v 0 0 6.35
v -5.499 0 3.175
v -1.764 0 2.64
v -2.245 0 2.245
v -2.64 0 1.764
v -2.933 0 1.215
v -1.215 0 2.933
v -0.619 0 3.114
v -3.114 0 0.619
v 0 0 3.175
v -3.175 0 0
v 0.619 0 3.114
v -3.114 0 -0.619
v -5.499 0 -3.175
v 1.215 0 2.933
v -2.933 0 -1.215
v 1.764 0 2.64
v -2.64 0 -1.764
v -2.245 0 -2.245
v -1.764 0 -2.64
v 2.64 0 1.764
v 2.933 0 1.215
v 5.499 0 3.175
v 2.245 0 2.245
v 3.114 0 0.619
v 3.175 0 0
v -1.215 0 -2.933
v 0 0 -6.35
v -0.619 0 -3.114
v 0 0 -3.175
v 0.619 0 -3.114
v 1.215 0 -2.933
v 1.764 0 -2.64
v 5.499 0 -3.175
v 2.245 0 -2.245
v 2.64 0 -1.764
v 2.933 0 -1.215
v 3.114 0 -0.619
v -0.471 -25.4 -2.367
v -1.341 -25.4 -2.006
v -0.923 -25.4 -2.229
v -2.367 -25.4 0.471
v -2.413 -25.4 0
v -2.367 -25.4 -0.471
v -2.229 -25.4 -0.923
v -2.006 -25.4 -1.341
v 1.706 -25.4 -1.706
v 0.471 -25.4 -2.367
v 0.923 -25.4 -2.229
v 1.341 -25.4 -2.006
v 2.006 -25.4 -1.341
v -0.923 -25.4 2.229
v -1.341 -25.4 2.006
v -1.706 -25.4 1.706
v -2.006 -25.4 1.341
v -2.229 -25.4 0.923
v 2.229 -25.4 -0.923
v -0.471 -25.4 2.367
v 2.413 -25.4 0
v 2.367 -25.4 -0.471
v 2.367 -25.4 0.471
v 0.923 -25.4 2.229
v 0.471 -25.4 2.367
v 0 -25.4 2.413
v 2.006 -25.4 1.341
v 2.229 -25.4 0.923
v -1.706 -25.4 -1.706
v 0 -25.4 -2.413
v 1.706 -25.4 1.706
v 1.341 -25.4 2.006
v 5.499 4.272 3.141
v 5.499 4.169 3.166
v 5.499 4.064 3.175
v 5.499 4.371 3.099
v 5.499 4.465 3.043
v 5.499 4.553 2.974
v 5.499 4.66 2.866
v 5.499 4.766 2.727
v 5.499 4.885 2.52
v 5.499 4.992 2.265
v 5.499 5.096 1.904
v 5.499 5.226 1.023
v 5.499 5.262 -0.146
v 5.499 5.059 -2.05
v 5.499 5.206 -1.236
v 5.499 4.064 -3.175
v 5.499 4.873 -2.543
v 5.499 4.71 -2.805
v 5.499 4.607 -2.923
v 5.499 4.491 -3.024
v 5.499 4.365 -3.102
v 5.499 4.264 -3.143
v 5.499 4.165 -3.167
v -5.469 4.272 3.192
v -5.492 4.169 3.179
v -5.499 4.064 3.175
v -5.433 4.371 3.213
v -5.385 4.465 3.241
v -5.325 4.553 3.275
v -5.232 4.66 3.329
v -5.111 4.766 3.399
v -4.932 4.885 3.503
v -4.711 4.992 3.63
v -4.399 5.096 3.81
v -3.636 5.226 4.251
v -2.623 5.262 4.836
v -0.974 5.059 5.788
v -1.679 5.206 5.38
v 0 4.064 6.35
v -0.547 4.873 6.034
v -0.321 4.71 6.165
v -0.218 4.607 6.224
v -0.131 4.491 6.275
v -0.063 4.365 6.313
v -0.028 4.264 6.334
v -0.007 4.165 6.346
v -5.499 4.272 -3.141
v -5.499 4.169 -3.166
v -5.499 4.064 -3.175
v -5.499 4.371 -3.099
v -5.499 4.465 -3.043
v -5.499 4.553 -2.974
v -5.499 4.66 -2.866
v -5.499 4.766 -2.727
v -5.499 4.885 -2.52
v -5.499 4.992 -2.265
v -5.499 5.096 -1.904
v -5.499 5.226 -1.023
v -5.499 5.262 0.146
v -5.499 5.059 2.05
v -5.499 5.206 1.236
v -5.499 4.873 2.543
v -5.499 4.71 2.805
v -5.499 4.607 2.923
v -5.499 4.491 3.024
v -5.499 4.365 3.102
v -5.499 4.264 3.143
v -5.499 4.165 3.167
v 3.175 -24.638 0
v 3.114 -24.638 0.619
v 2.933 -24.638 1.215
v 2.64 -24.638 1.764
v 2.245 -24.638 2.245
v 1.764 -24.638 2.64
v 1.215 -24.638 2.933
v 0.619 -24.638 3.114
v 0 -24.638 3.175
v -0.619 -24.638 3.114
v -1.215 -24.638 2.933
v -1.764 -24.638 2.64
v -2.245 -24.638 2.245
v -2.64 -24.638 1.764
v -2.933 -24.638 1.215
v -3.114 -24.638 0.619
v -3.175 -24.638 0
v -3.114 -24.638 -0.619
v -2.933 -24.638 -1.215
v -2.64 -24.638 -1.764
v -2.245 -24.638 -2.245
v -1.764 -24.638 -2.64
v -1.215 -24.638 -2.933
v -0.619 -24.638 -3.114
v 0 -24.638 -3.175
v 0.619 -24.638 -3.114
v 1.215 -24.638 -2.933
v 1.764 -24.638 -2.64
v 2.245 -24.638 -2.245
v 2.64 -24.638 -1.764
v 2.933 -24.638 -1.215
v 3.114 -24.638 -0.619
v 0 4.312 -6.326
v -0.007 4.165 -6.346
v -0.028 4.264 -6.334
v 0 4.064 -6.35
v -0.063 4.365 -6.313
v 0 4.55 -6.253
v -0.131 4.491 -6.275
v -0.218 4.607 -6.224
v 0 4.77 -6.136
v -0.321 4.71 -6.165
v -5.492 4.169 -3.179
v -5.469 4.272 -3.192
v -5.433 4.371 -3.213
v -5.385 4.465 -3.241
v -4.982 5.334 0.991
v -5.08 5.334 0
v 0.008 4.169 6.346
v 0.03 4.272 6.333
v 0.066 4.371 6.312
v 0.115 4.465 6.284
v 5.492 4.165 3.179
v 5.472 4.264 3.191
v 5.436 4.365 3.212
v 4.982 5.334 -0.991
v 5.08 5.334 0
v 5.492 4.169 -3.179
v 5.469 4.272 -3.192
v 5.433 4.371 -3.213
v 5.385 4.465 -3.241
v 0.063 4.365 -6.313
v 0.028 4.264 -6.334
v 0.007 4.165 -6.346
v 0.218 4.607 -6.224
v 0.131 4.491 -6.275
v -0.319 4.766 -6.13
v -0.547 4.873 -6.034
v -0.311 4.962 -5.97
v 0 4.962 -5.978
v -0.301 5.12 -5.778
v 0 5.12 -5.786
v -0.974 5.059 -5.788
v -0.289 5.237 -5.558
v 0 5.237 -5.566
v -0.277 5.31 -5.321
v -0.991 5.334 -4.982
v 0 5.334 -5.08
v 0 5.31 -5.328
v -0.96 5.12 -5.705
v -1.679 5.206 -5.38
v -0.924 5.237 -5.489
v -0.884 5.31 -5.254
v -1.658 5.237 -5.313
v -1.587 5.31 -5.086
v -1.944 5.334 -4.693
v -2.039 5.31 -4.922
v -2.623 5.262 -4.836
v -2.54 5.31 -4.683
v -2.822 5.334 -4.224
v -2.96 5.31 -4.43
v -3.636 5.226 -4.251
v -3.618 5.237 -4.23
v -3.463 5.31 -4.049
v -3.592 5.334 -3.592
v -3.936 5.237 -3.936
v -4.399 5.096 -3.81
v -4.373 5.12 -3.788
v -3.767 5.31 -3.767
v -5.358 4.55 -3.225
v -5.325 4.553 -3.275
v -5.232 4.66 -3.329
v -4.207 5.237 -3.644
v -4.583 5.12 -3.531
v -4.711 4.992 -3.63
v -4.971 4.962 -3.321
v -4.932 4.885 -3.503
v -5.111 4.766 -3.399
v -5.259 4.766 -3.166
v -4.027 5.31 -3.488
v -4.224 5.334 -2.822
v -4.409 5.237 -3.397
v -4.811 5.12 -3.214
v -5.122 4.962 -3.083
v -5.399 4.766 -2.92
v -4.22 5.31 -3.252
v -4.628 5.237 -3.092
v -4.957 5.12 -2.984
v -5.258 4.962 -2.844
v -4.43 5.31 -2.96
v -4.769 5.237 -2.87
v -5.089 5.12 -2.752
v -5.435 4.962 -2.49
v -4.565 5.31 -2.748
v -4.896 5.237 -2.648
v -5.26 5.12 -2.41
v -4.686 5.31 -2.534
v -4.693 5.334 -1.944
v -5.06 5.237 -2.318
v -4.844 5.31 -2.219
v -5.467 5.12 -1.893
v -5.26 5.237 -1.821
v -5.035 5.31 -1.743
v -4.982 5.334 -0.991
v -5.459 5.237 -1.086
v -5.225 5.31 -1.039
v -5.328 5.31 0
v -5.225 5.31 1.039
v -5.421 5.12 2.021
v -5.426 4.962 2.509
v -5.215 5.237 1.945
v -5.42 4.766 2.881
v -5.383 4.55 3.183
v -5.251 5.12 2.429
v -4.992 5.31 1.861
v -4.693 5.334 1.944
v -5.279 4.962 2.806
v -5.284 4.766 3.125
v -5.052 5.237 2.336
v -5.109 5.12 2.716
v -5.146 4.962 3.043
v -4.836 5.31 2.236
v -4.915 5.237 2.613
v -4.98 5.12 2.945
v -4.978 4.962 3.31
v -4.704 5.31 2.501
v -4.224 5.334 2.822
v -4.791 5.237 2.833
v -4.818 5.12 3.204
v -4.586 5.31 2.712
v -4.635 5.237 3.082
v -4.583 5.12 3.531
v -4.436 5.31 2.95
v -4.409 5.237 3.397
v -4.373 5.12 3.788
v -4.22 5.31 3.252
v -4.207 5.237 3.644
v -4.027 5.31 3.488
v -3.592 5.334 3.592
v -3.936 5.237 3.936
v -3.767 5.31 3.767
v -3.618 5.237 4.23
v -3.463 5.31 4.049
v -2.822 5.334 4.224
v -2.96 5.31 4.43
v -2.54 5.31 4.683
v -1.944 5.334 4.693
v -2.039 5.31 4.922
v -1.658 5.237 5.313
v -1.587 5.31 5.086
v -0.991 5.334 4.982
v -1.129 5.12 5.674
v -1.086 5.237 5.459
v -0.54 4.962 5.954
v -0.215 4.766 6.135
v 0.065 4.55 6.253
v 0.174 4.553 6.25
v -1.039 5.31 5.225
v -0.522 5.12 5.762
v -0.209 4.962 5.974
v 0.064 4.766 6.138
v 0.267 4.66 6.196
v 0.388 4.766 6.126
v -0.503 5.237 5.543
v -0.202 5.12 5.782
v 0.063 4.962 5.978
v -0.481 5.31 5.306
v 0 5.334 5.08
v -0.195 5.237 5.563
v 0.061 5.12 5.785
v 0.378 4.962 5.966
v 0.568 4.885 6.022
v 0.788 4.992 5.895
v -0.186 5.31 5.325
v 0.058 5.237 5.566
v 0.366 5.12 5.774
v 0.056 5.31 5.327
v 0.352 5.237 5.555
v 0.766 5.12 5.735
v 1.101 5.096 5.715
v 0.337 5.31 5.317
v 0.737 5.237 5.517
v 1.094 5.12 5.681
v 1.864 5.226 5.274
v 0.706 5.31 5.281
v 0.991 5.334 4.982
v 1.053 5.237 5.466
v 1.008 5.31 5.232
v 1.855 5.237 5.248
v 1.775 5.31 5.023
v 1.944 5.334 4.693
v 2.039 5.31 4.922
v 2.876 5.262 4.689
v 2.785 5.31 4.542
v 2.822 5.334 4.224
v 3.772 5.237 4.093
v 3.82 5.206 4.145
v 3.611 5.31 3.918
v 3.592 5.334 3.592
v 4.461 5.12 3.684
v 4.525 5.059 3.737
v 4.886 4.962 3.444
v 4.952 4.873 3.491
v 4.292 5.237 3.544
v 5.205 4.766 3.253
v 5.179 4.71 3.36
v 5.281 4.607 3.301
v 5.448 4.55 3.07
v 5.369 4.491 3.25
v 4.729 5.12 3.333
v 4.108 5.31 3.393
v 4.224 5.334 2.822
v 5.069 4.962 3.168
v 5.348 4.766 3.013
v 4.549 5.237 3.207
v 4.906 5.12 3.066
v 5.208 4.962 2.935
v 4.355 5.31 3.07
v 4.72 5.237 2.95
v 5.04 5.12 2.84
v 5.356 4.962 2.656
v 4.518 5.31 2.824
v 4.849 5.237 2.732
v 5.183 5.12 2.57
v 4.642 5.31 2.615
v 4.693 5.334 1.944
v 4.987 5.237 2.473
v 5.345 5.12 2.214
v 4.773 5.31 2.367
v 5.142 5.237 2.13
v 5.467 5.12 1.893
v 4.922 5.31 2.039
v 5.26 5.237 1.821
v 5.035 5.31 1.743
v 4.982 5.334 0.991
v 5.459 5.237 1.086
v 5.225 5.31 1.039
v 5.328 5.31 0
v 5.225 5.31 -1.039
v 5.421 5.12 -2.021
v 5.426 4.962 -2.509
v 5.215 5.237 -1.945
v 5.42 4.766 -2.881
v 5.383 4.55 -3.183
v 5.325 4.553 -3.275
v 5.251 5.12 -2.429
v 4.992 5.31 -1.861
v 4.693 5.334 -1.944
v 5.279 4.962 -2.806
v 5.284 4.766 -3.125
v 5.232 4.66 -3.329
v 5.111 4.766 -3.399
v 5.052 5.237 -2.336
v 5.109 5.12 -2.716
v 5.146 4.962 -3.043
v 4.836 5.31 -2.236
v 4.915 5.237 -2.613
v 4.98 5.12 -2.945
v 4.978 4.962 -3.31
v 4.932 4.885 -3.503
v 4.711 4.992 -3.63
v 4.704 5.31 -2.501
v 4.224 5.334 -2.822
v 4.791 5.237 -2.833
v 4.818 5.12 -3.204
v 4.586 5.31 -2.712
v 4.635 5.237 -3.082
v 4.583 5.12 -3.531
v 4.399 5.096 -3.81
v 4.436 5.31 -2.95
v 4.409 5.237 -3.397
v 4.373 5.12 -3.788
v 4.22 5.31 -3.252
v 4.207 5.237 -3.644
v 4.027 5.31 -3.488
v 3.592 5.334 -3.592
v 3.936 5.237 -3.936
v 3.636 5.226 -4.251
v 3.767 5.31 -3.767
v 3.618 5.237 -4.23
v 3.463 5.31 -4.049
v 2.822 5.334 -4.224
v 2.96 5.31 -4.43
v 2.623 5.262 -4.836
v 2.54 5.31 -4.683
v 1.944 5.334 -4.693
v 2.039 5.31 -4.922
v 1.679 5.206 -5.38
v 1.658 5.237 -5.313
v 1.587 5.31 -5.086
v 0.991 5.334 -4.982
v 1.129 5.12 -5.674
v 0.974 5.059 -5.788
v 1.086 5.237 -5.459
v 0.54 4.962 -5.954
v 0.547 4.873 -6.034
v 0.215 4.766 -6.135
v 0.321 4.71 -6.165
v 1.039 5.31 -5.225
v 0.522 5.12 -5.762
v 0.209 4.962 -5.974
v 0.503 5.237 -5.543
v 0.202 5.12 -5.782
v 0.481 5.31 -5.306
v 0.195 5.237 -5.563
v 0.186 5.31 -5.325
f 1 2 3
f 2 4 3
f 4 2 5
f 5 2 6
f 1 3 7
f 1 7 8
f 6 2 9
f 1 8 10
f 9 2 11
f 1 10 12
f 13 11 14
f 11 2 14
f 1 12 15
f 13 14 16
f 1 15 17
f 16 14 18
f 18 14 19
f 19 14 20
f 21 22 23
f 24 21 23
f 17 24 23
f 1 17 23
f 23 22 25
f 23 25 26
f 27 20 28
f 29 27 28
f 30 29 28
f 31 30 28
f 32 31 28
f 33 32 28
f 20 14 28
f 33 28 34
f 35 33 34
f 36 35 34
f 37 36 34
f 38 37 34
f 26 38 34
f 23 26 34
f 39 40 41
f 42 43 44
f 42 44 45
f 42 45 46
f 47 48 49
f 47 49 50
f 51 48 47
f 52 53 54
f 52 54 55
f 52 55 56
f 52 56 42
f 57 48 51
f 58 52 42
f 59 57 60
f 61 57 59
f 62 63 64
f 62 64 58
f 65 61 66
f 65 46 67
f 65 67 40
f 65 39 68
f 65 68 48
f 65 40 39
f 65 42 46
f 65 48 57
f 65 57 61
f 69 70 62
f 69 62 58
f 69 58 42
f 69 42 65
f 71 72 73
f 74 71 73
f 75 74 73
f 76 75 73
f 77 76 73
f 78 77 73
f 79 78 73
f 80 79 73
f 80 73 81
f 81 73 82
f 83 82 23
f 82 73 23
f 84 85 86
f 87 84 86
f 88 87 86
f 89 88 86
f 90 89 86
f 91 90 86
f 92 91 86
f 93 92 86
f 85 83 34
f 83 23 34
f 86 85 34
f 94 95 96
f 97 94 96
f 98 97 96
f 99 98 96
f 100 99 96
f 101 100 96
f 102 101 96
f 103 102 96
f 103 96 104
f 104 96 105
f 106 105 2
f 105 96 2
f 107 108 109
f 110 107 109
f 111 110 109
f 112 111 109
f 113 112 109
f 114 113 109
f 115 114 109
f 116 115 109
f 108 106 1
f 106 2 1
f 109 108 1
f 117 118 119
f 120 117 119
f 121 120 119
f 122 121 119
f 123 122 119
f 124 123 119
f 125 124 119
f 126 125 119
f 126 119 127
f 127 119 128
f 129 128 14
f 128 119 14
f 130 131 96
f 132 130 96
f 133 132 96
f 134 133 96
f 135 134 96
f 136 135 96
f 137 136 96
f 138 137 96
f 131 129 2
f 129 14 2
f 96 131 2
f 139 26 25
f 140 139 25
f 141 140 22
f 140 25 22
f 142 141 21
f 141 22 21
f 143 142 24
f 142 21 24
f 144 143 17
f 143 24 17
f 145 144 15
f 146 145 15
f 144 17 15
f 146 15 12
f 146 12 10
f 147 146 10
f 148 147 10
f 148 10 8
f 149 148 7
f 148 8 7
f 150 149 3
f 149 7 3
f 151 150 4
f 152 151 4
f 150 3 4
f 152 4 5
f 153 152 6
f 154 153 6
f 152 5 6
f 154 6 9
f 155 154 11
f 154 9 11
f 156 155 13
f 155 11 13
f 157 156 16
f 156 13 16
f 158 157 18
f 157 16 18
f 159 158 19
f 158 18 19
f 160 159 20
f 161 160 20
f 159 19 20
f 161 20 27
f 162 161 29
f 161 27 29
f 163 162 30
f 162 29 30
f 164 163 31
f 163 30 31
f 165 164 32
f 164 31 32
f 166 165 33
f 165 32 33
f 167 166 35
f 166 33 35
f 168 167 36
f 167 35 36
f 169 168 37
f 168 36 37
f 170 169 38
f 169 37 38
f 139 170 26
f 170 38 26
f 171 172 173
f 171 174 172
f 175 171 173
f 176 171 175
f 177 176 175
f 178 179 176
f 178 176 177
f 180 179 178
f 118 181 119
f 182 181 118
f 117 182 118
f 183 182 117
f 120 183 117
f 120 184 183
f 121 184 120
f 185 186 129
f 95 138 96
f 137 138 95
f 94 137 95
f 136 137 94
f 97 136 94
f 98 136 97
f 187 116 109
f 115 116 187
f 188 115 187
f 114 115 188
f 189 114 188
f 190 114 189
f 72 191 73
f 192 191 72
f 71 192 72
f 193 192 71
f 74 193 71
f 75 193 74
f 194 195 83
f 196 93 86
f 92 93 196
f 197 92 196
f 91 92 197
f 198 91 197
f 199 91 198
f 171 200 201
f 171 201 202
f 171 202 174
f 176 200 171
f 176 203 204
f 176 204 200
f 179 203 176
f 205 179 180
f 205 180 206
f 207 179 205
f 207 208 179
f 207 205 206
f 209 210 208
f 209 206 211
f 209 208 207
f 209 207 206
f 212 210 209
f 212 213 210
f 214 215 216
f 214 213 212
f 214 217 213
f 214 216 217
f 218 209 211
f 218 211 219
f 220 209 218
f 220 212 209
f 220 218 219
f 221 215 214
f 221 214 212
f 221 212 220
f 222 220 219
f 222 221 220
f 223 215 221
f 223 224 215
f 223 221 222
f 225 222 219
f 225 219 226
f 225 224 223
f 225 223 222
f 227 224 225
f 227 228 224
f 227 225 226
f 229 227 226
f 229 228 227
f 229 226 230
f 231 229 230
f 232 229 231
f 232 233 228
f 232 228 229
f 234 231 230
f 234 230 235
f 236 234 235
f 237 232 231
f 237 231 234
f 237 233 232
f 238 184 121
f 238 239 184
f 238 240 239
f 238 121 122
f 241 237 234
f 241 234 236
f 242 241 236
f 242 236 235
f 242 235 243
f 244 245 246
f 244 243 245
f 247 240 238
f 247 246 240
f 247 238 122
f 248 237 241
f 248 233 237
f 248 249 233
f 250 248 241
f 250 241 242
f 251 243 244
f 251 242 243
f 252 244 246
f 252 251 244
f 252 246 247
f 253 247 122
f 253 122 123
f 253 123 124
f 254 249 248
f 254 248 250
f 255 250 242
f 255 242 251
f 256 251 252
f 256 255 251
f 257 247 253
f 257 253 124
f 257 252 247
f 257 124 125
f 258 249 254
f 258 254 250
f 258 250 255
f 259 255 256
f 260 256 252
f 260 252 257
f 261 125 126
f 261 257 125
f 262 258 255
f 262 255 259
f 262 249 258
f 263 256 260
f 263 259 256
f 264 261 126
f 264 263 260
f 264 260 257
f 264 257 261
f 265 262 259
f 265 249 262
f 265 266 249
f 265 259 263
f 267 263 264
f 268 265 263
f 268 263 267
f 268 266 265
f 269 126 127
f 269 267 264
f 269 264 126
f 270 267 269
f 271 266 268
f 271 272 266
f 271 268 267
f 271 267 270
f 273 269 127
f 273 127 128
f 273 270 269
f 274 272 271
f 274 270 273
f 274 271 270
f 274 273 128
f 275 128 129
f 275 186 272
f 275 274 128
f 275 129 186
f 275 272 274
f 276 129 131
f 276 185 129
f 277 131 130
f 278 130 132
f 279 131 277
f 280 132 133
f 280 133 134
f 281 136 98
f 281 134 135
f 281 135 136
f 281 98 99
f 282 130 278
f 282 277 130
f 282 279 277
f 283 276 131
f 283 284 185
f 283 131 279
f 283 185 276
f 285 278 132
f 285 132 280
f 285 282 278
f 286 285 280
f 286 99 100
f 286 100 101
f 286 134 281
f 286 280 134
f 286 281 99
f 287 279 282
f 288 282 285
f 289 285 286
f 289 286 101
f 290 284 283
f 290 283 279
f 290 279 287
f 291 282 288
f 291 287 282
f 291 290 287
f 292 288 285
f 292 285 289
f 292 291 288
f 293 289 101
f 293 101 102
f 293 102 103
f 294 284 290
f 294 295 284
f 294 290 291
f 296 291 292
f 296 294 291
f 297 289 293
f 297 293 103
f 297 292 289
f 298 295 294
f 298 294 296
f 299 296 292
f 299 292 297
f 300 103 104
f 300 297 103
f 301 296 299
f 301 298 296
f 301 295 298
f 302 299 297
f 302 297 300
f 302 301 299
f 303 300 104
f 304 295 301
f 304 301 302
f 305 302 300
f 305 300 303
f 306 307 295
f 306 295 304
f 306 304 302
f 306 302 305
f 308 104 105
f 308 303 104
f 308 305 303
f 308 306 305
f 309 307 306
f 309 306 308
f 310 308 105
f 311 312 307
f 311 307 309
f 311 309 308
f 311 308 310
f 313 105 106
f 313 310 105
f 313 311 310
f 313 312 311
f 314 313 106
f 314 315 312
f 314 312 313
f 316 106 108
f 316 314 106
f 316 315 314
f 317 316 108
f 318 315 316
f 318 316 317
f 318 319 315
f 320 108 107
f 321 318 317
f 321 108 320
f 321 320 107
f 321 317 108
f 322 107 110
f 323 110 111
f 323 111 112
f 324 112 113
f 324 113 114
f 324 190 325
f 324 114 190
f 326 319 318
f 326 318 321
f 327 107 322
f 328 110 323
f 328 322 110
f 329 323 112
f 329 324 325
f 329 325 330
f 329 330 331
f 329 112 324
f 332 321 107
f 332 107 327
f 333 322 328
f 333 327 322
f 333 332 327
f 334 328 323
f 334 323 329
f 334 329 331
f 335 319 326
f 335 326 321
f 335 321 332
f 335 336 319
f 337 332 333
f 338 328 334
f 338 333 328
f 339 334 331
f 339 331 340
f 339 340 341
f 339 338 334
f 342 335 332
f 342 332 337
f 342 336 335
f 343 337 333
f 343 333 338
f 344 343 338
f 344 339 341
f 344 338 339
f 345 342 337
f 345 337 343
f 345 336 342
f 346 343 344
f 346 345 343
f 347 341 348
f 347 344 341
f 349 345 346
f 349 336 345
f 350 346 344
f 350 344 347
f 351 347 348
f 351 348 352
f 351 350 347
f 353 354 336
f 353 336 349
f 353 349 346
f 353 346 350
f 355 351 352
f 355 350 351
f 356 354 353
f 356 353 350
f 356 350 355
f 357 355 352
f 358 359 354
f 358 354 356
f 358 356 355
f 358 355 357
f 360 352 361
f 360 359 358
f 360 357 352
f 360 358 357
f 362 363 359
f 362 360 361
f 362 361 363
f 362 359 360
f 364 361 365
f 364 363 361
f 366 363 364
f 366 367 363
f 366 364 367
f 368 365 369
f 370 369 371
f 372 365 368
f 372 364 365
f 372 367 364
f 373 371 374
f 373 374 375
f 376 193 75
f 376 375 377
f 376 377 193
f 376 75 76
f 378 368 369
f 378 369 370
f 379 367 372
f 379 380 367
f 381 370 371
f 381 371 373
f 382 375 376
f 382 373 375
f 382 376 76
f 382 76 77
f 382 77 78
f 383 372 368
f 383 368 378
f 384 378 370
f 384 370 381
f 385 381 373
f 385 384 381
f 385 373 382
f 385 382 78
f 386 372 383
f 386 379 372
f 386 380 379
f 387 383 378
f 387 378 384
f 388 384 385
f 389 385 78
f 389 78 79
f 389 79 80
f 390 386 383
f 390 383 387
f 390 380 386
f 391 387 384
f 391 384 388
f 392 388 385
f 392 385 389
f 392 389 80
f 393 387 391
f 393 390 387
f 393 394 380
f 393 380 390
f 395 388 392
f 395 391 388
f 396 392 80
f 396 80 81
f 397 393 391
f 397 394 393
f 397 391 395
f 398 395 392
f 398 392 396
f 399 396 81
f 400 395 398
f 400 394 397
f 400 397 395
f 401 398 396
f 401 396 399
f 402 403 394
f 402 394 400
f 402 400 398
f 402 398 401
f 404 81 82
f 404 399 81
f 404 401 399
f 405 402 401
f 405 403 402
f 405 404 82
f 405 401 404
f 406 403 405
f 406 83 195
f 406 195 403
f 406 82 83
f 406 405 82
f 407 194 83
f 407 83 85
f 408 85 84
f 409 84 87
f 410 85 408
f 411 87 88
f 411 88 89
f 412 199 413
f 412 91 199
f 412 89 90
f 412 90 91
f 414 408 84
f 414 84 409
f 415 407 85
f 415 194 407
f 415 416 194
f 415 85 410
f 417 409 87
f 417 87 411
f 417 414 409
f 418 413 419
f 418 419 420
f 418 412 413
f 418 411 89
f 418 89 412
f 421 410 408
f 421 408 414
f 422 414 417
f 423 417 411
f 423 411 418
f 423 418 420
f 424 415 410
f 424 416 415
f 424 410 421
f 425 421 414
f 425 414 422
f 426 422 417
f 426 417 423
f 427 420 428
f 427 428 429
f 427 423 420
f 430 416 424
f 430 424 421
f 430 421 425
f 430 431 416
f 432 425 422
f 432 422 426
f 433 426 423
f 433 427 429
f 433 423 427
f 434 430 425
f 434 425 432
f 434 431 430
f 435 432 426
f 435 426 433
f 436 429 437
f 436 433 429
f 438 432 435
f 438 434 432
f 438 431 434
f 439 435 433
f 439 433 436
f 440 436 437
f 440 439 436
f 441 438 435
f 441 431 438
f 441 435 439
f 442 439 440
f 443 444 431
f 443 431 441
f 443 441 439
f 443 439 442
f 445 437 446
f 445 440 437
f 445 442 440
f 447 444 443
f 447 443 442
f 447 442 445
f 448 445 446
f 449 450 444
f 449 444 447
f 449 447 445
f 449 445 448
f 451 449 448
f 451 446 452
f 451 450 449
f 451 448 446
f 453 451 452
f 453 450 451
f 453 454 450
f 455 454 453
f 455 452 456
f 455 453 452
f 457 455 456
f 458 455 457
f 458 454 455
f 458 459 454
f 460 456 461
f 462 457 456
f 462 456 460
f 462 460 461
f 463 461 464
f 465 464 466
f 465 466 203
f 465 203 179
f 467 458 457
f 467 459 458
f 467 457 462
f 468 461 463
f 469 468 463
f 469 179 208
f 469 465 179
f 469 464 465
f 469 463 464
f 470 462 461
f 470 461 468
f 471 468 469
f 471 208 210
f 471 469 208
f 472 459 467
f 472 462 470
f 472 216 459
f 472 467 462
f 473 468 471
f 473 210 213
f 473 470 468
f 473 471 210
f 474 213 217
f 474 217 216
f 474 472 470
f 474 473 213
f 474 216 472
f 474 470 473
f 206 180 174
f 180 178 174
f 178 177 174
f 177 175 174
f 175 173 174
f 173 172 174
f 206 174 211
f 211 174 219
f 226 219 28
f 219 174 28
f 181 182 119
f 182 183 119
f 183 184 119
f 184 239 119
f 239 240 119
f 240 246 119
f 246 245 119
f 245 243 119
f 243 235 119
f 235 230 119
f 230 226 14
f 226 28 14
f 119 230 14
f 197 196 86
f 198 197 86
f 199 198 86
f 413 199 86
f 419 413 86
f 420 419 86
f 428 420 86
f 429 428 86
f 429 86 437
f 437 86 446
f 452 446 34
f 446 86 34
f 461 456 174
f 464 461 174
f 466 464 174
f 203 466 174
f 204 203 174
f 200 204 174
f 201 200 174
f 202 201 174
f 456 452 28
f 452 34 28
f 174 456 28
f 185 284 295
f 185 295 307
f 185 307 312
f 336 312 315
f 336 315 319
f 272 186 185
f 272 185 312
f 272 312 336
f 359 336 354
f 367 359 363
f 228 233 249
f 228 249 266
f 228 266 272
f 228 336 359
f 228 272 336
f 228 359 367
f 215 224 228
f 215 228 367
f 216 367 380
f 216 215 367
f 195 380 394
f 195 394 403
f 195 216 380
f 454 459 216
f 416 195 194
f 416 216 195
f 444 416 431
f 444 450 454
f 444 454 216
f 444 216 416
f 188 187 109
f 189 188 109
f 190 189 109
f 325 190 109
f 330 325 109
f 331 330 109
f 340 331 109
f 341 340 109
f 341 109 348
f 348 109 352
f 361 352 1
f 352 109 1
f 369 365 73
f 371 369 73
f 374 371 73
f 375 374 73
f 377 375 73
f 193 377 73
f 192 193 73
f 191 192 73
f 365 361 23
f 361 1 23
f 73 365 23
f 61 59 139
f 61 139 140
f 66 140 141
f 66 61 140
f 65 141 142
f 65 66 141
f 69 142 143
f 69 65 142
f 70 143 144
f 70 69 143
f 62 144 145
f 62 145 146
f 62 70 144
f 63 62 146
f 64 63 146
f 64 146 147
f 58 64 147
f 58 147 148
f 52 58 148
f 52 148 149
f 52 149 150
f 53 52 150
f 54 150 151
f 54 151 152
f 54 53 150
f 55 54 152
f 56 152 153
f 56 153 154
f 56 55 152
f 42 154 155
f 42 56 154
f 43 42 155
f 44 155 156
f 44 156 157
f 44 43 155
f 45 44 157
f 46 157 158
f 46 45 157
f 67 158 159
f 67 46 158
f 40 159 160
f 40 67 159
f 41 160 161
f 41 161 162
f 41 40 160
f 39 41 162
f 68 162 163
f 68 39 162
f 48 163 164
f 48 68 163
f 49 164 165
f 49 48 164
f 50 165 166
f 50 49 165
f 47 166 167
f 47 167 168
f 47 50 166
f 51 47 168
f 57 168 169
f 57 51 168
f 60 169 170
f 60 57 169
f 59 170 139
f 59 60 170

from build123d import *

# Parameters (mm, degrees)
EXTRUDE1_DEPTH = 5.334
SKETCH3_R      = 3.175
EXTRUDE2_DEPTH = 25.4
CHAMFER1_SIZE  = 0.762


with BuildPart() as part:
    # Sketch1 → Extrude1 (new body)
    with BuildSketch(Plane(origin=(0, 0, 0), x_dir=(1, 0, 0), z_dir=(0, 1, 0))):
        Polygon((0, 6.35), (-5.499261314, 3.175), (-5.499261314, -3.175), (0, -6.35), (5.499261314, -3.175), (5.499261314, 3.175), align=None)
    extrude(amount=EXTRUDE1_DEPTH)

    # Sketch3 → Extrude2 (add)
    with BuildSketch(Plane.XZ):
        Circle(SKETCH3_R)
    extrude(amount=EXTRUDE2_DEPTH)

    # Sketch2 → Cut-Revolve1 (revolve, cut)
    with BuildSketch(Plane(origin=(0, 0, 0), x_dir=(0, 0, -1), z_dir=(1, 0, 0))):
        with BuildLine():
            Line((5.08, 5.334), (6.35, 5.334))
            Line((6.35, 5.334), (6.35, 4.064))
            ThreePointArc((6.35, 4.064), (5.978025612, 4.962025612), (5.08, 5.334))
        make_face()
    revolve(axis=Axis((0, -25.4, 0), (0, 1, 0)), mode=Mode.SUBTRACT)

    # Chamfer1
    chamfer1_edges = [part.edges().sort_by_distance(p)[0] for p in [
        (-3.175, -25.4, 0),
    ]]
    chamfer(chamfer1_edges, length=CHAMFER1_SIZE)


solid = part.part
